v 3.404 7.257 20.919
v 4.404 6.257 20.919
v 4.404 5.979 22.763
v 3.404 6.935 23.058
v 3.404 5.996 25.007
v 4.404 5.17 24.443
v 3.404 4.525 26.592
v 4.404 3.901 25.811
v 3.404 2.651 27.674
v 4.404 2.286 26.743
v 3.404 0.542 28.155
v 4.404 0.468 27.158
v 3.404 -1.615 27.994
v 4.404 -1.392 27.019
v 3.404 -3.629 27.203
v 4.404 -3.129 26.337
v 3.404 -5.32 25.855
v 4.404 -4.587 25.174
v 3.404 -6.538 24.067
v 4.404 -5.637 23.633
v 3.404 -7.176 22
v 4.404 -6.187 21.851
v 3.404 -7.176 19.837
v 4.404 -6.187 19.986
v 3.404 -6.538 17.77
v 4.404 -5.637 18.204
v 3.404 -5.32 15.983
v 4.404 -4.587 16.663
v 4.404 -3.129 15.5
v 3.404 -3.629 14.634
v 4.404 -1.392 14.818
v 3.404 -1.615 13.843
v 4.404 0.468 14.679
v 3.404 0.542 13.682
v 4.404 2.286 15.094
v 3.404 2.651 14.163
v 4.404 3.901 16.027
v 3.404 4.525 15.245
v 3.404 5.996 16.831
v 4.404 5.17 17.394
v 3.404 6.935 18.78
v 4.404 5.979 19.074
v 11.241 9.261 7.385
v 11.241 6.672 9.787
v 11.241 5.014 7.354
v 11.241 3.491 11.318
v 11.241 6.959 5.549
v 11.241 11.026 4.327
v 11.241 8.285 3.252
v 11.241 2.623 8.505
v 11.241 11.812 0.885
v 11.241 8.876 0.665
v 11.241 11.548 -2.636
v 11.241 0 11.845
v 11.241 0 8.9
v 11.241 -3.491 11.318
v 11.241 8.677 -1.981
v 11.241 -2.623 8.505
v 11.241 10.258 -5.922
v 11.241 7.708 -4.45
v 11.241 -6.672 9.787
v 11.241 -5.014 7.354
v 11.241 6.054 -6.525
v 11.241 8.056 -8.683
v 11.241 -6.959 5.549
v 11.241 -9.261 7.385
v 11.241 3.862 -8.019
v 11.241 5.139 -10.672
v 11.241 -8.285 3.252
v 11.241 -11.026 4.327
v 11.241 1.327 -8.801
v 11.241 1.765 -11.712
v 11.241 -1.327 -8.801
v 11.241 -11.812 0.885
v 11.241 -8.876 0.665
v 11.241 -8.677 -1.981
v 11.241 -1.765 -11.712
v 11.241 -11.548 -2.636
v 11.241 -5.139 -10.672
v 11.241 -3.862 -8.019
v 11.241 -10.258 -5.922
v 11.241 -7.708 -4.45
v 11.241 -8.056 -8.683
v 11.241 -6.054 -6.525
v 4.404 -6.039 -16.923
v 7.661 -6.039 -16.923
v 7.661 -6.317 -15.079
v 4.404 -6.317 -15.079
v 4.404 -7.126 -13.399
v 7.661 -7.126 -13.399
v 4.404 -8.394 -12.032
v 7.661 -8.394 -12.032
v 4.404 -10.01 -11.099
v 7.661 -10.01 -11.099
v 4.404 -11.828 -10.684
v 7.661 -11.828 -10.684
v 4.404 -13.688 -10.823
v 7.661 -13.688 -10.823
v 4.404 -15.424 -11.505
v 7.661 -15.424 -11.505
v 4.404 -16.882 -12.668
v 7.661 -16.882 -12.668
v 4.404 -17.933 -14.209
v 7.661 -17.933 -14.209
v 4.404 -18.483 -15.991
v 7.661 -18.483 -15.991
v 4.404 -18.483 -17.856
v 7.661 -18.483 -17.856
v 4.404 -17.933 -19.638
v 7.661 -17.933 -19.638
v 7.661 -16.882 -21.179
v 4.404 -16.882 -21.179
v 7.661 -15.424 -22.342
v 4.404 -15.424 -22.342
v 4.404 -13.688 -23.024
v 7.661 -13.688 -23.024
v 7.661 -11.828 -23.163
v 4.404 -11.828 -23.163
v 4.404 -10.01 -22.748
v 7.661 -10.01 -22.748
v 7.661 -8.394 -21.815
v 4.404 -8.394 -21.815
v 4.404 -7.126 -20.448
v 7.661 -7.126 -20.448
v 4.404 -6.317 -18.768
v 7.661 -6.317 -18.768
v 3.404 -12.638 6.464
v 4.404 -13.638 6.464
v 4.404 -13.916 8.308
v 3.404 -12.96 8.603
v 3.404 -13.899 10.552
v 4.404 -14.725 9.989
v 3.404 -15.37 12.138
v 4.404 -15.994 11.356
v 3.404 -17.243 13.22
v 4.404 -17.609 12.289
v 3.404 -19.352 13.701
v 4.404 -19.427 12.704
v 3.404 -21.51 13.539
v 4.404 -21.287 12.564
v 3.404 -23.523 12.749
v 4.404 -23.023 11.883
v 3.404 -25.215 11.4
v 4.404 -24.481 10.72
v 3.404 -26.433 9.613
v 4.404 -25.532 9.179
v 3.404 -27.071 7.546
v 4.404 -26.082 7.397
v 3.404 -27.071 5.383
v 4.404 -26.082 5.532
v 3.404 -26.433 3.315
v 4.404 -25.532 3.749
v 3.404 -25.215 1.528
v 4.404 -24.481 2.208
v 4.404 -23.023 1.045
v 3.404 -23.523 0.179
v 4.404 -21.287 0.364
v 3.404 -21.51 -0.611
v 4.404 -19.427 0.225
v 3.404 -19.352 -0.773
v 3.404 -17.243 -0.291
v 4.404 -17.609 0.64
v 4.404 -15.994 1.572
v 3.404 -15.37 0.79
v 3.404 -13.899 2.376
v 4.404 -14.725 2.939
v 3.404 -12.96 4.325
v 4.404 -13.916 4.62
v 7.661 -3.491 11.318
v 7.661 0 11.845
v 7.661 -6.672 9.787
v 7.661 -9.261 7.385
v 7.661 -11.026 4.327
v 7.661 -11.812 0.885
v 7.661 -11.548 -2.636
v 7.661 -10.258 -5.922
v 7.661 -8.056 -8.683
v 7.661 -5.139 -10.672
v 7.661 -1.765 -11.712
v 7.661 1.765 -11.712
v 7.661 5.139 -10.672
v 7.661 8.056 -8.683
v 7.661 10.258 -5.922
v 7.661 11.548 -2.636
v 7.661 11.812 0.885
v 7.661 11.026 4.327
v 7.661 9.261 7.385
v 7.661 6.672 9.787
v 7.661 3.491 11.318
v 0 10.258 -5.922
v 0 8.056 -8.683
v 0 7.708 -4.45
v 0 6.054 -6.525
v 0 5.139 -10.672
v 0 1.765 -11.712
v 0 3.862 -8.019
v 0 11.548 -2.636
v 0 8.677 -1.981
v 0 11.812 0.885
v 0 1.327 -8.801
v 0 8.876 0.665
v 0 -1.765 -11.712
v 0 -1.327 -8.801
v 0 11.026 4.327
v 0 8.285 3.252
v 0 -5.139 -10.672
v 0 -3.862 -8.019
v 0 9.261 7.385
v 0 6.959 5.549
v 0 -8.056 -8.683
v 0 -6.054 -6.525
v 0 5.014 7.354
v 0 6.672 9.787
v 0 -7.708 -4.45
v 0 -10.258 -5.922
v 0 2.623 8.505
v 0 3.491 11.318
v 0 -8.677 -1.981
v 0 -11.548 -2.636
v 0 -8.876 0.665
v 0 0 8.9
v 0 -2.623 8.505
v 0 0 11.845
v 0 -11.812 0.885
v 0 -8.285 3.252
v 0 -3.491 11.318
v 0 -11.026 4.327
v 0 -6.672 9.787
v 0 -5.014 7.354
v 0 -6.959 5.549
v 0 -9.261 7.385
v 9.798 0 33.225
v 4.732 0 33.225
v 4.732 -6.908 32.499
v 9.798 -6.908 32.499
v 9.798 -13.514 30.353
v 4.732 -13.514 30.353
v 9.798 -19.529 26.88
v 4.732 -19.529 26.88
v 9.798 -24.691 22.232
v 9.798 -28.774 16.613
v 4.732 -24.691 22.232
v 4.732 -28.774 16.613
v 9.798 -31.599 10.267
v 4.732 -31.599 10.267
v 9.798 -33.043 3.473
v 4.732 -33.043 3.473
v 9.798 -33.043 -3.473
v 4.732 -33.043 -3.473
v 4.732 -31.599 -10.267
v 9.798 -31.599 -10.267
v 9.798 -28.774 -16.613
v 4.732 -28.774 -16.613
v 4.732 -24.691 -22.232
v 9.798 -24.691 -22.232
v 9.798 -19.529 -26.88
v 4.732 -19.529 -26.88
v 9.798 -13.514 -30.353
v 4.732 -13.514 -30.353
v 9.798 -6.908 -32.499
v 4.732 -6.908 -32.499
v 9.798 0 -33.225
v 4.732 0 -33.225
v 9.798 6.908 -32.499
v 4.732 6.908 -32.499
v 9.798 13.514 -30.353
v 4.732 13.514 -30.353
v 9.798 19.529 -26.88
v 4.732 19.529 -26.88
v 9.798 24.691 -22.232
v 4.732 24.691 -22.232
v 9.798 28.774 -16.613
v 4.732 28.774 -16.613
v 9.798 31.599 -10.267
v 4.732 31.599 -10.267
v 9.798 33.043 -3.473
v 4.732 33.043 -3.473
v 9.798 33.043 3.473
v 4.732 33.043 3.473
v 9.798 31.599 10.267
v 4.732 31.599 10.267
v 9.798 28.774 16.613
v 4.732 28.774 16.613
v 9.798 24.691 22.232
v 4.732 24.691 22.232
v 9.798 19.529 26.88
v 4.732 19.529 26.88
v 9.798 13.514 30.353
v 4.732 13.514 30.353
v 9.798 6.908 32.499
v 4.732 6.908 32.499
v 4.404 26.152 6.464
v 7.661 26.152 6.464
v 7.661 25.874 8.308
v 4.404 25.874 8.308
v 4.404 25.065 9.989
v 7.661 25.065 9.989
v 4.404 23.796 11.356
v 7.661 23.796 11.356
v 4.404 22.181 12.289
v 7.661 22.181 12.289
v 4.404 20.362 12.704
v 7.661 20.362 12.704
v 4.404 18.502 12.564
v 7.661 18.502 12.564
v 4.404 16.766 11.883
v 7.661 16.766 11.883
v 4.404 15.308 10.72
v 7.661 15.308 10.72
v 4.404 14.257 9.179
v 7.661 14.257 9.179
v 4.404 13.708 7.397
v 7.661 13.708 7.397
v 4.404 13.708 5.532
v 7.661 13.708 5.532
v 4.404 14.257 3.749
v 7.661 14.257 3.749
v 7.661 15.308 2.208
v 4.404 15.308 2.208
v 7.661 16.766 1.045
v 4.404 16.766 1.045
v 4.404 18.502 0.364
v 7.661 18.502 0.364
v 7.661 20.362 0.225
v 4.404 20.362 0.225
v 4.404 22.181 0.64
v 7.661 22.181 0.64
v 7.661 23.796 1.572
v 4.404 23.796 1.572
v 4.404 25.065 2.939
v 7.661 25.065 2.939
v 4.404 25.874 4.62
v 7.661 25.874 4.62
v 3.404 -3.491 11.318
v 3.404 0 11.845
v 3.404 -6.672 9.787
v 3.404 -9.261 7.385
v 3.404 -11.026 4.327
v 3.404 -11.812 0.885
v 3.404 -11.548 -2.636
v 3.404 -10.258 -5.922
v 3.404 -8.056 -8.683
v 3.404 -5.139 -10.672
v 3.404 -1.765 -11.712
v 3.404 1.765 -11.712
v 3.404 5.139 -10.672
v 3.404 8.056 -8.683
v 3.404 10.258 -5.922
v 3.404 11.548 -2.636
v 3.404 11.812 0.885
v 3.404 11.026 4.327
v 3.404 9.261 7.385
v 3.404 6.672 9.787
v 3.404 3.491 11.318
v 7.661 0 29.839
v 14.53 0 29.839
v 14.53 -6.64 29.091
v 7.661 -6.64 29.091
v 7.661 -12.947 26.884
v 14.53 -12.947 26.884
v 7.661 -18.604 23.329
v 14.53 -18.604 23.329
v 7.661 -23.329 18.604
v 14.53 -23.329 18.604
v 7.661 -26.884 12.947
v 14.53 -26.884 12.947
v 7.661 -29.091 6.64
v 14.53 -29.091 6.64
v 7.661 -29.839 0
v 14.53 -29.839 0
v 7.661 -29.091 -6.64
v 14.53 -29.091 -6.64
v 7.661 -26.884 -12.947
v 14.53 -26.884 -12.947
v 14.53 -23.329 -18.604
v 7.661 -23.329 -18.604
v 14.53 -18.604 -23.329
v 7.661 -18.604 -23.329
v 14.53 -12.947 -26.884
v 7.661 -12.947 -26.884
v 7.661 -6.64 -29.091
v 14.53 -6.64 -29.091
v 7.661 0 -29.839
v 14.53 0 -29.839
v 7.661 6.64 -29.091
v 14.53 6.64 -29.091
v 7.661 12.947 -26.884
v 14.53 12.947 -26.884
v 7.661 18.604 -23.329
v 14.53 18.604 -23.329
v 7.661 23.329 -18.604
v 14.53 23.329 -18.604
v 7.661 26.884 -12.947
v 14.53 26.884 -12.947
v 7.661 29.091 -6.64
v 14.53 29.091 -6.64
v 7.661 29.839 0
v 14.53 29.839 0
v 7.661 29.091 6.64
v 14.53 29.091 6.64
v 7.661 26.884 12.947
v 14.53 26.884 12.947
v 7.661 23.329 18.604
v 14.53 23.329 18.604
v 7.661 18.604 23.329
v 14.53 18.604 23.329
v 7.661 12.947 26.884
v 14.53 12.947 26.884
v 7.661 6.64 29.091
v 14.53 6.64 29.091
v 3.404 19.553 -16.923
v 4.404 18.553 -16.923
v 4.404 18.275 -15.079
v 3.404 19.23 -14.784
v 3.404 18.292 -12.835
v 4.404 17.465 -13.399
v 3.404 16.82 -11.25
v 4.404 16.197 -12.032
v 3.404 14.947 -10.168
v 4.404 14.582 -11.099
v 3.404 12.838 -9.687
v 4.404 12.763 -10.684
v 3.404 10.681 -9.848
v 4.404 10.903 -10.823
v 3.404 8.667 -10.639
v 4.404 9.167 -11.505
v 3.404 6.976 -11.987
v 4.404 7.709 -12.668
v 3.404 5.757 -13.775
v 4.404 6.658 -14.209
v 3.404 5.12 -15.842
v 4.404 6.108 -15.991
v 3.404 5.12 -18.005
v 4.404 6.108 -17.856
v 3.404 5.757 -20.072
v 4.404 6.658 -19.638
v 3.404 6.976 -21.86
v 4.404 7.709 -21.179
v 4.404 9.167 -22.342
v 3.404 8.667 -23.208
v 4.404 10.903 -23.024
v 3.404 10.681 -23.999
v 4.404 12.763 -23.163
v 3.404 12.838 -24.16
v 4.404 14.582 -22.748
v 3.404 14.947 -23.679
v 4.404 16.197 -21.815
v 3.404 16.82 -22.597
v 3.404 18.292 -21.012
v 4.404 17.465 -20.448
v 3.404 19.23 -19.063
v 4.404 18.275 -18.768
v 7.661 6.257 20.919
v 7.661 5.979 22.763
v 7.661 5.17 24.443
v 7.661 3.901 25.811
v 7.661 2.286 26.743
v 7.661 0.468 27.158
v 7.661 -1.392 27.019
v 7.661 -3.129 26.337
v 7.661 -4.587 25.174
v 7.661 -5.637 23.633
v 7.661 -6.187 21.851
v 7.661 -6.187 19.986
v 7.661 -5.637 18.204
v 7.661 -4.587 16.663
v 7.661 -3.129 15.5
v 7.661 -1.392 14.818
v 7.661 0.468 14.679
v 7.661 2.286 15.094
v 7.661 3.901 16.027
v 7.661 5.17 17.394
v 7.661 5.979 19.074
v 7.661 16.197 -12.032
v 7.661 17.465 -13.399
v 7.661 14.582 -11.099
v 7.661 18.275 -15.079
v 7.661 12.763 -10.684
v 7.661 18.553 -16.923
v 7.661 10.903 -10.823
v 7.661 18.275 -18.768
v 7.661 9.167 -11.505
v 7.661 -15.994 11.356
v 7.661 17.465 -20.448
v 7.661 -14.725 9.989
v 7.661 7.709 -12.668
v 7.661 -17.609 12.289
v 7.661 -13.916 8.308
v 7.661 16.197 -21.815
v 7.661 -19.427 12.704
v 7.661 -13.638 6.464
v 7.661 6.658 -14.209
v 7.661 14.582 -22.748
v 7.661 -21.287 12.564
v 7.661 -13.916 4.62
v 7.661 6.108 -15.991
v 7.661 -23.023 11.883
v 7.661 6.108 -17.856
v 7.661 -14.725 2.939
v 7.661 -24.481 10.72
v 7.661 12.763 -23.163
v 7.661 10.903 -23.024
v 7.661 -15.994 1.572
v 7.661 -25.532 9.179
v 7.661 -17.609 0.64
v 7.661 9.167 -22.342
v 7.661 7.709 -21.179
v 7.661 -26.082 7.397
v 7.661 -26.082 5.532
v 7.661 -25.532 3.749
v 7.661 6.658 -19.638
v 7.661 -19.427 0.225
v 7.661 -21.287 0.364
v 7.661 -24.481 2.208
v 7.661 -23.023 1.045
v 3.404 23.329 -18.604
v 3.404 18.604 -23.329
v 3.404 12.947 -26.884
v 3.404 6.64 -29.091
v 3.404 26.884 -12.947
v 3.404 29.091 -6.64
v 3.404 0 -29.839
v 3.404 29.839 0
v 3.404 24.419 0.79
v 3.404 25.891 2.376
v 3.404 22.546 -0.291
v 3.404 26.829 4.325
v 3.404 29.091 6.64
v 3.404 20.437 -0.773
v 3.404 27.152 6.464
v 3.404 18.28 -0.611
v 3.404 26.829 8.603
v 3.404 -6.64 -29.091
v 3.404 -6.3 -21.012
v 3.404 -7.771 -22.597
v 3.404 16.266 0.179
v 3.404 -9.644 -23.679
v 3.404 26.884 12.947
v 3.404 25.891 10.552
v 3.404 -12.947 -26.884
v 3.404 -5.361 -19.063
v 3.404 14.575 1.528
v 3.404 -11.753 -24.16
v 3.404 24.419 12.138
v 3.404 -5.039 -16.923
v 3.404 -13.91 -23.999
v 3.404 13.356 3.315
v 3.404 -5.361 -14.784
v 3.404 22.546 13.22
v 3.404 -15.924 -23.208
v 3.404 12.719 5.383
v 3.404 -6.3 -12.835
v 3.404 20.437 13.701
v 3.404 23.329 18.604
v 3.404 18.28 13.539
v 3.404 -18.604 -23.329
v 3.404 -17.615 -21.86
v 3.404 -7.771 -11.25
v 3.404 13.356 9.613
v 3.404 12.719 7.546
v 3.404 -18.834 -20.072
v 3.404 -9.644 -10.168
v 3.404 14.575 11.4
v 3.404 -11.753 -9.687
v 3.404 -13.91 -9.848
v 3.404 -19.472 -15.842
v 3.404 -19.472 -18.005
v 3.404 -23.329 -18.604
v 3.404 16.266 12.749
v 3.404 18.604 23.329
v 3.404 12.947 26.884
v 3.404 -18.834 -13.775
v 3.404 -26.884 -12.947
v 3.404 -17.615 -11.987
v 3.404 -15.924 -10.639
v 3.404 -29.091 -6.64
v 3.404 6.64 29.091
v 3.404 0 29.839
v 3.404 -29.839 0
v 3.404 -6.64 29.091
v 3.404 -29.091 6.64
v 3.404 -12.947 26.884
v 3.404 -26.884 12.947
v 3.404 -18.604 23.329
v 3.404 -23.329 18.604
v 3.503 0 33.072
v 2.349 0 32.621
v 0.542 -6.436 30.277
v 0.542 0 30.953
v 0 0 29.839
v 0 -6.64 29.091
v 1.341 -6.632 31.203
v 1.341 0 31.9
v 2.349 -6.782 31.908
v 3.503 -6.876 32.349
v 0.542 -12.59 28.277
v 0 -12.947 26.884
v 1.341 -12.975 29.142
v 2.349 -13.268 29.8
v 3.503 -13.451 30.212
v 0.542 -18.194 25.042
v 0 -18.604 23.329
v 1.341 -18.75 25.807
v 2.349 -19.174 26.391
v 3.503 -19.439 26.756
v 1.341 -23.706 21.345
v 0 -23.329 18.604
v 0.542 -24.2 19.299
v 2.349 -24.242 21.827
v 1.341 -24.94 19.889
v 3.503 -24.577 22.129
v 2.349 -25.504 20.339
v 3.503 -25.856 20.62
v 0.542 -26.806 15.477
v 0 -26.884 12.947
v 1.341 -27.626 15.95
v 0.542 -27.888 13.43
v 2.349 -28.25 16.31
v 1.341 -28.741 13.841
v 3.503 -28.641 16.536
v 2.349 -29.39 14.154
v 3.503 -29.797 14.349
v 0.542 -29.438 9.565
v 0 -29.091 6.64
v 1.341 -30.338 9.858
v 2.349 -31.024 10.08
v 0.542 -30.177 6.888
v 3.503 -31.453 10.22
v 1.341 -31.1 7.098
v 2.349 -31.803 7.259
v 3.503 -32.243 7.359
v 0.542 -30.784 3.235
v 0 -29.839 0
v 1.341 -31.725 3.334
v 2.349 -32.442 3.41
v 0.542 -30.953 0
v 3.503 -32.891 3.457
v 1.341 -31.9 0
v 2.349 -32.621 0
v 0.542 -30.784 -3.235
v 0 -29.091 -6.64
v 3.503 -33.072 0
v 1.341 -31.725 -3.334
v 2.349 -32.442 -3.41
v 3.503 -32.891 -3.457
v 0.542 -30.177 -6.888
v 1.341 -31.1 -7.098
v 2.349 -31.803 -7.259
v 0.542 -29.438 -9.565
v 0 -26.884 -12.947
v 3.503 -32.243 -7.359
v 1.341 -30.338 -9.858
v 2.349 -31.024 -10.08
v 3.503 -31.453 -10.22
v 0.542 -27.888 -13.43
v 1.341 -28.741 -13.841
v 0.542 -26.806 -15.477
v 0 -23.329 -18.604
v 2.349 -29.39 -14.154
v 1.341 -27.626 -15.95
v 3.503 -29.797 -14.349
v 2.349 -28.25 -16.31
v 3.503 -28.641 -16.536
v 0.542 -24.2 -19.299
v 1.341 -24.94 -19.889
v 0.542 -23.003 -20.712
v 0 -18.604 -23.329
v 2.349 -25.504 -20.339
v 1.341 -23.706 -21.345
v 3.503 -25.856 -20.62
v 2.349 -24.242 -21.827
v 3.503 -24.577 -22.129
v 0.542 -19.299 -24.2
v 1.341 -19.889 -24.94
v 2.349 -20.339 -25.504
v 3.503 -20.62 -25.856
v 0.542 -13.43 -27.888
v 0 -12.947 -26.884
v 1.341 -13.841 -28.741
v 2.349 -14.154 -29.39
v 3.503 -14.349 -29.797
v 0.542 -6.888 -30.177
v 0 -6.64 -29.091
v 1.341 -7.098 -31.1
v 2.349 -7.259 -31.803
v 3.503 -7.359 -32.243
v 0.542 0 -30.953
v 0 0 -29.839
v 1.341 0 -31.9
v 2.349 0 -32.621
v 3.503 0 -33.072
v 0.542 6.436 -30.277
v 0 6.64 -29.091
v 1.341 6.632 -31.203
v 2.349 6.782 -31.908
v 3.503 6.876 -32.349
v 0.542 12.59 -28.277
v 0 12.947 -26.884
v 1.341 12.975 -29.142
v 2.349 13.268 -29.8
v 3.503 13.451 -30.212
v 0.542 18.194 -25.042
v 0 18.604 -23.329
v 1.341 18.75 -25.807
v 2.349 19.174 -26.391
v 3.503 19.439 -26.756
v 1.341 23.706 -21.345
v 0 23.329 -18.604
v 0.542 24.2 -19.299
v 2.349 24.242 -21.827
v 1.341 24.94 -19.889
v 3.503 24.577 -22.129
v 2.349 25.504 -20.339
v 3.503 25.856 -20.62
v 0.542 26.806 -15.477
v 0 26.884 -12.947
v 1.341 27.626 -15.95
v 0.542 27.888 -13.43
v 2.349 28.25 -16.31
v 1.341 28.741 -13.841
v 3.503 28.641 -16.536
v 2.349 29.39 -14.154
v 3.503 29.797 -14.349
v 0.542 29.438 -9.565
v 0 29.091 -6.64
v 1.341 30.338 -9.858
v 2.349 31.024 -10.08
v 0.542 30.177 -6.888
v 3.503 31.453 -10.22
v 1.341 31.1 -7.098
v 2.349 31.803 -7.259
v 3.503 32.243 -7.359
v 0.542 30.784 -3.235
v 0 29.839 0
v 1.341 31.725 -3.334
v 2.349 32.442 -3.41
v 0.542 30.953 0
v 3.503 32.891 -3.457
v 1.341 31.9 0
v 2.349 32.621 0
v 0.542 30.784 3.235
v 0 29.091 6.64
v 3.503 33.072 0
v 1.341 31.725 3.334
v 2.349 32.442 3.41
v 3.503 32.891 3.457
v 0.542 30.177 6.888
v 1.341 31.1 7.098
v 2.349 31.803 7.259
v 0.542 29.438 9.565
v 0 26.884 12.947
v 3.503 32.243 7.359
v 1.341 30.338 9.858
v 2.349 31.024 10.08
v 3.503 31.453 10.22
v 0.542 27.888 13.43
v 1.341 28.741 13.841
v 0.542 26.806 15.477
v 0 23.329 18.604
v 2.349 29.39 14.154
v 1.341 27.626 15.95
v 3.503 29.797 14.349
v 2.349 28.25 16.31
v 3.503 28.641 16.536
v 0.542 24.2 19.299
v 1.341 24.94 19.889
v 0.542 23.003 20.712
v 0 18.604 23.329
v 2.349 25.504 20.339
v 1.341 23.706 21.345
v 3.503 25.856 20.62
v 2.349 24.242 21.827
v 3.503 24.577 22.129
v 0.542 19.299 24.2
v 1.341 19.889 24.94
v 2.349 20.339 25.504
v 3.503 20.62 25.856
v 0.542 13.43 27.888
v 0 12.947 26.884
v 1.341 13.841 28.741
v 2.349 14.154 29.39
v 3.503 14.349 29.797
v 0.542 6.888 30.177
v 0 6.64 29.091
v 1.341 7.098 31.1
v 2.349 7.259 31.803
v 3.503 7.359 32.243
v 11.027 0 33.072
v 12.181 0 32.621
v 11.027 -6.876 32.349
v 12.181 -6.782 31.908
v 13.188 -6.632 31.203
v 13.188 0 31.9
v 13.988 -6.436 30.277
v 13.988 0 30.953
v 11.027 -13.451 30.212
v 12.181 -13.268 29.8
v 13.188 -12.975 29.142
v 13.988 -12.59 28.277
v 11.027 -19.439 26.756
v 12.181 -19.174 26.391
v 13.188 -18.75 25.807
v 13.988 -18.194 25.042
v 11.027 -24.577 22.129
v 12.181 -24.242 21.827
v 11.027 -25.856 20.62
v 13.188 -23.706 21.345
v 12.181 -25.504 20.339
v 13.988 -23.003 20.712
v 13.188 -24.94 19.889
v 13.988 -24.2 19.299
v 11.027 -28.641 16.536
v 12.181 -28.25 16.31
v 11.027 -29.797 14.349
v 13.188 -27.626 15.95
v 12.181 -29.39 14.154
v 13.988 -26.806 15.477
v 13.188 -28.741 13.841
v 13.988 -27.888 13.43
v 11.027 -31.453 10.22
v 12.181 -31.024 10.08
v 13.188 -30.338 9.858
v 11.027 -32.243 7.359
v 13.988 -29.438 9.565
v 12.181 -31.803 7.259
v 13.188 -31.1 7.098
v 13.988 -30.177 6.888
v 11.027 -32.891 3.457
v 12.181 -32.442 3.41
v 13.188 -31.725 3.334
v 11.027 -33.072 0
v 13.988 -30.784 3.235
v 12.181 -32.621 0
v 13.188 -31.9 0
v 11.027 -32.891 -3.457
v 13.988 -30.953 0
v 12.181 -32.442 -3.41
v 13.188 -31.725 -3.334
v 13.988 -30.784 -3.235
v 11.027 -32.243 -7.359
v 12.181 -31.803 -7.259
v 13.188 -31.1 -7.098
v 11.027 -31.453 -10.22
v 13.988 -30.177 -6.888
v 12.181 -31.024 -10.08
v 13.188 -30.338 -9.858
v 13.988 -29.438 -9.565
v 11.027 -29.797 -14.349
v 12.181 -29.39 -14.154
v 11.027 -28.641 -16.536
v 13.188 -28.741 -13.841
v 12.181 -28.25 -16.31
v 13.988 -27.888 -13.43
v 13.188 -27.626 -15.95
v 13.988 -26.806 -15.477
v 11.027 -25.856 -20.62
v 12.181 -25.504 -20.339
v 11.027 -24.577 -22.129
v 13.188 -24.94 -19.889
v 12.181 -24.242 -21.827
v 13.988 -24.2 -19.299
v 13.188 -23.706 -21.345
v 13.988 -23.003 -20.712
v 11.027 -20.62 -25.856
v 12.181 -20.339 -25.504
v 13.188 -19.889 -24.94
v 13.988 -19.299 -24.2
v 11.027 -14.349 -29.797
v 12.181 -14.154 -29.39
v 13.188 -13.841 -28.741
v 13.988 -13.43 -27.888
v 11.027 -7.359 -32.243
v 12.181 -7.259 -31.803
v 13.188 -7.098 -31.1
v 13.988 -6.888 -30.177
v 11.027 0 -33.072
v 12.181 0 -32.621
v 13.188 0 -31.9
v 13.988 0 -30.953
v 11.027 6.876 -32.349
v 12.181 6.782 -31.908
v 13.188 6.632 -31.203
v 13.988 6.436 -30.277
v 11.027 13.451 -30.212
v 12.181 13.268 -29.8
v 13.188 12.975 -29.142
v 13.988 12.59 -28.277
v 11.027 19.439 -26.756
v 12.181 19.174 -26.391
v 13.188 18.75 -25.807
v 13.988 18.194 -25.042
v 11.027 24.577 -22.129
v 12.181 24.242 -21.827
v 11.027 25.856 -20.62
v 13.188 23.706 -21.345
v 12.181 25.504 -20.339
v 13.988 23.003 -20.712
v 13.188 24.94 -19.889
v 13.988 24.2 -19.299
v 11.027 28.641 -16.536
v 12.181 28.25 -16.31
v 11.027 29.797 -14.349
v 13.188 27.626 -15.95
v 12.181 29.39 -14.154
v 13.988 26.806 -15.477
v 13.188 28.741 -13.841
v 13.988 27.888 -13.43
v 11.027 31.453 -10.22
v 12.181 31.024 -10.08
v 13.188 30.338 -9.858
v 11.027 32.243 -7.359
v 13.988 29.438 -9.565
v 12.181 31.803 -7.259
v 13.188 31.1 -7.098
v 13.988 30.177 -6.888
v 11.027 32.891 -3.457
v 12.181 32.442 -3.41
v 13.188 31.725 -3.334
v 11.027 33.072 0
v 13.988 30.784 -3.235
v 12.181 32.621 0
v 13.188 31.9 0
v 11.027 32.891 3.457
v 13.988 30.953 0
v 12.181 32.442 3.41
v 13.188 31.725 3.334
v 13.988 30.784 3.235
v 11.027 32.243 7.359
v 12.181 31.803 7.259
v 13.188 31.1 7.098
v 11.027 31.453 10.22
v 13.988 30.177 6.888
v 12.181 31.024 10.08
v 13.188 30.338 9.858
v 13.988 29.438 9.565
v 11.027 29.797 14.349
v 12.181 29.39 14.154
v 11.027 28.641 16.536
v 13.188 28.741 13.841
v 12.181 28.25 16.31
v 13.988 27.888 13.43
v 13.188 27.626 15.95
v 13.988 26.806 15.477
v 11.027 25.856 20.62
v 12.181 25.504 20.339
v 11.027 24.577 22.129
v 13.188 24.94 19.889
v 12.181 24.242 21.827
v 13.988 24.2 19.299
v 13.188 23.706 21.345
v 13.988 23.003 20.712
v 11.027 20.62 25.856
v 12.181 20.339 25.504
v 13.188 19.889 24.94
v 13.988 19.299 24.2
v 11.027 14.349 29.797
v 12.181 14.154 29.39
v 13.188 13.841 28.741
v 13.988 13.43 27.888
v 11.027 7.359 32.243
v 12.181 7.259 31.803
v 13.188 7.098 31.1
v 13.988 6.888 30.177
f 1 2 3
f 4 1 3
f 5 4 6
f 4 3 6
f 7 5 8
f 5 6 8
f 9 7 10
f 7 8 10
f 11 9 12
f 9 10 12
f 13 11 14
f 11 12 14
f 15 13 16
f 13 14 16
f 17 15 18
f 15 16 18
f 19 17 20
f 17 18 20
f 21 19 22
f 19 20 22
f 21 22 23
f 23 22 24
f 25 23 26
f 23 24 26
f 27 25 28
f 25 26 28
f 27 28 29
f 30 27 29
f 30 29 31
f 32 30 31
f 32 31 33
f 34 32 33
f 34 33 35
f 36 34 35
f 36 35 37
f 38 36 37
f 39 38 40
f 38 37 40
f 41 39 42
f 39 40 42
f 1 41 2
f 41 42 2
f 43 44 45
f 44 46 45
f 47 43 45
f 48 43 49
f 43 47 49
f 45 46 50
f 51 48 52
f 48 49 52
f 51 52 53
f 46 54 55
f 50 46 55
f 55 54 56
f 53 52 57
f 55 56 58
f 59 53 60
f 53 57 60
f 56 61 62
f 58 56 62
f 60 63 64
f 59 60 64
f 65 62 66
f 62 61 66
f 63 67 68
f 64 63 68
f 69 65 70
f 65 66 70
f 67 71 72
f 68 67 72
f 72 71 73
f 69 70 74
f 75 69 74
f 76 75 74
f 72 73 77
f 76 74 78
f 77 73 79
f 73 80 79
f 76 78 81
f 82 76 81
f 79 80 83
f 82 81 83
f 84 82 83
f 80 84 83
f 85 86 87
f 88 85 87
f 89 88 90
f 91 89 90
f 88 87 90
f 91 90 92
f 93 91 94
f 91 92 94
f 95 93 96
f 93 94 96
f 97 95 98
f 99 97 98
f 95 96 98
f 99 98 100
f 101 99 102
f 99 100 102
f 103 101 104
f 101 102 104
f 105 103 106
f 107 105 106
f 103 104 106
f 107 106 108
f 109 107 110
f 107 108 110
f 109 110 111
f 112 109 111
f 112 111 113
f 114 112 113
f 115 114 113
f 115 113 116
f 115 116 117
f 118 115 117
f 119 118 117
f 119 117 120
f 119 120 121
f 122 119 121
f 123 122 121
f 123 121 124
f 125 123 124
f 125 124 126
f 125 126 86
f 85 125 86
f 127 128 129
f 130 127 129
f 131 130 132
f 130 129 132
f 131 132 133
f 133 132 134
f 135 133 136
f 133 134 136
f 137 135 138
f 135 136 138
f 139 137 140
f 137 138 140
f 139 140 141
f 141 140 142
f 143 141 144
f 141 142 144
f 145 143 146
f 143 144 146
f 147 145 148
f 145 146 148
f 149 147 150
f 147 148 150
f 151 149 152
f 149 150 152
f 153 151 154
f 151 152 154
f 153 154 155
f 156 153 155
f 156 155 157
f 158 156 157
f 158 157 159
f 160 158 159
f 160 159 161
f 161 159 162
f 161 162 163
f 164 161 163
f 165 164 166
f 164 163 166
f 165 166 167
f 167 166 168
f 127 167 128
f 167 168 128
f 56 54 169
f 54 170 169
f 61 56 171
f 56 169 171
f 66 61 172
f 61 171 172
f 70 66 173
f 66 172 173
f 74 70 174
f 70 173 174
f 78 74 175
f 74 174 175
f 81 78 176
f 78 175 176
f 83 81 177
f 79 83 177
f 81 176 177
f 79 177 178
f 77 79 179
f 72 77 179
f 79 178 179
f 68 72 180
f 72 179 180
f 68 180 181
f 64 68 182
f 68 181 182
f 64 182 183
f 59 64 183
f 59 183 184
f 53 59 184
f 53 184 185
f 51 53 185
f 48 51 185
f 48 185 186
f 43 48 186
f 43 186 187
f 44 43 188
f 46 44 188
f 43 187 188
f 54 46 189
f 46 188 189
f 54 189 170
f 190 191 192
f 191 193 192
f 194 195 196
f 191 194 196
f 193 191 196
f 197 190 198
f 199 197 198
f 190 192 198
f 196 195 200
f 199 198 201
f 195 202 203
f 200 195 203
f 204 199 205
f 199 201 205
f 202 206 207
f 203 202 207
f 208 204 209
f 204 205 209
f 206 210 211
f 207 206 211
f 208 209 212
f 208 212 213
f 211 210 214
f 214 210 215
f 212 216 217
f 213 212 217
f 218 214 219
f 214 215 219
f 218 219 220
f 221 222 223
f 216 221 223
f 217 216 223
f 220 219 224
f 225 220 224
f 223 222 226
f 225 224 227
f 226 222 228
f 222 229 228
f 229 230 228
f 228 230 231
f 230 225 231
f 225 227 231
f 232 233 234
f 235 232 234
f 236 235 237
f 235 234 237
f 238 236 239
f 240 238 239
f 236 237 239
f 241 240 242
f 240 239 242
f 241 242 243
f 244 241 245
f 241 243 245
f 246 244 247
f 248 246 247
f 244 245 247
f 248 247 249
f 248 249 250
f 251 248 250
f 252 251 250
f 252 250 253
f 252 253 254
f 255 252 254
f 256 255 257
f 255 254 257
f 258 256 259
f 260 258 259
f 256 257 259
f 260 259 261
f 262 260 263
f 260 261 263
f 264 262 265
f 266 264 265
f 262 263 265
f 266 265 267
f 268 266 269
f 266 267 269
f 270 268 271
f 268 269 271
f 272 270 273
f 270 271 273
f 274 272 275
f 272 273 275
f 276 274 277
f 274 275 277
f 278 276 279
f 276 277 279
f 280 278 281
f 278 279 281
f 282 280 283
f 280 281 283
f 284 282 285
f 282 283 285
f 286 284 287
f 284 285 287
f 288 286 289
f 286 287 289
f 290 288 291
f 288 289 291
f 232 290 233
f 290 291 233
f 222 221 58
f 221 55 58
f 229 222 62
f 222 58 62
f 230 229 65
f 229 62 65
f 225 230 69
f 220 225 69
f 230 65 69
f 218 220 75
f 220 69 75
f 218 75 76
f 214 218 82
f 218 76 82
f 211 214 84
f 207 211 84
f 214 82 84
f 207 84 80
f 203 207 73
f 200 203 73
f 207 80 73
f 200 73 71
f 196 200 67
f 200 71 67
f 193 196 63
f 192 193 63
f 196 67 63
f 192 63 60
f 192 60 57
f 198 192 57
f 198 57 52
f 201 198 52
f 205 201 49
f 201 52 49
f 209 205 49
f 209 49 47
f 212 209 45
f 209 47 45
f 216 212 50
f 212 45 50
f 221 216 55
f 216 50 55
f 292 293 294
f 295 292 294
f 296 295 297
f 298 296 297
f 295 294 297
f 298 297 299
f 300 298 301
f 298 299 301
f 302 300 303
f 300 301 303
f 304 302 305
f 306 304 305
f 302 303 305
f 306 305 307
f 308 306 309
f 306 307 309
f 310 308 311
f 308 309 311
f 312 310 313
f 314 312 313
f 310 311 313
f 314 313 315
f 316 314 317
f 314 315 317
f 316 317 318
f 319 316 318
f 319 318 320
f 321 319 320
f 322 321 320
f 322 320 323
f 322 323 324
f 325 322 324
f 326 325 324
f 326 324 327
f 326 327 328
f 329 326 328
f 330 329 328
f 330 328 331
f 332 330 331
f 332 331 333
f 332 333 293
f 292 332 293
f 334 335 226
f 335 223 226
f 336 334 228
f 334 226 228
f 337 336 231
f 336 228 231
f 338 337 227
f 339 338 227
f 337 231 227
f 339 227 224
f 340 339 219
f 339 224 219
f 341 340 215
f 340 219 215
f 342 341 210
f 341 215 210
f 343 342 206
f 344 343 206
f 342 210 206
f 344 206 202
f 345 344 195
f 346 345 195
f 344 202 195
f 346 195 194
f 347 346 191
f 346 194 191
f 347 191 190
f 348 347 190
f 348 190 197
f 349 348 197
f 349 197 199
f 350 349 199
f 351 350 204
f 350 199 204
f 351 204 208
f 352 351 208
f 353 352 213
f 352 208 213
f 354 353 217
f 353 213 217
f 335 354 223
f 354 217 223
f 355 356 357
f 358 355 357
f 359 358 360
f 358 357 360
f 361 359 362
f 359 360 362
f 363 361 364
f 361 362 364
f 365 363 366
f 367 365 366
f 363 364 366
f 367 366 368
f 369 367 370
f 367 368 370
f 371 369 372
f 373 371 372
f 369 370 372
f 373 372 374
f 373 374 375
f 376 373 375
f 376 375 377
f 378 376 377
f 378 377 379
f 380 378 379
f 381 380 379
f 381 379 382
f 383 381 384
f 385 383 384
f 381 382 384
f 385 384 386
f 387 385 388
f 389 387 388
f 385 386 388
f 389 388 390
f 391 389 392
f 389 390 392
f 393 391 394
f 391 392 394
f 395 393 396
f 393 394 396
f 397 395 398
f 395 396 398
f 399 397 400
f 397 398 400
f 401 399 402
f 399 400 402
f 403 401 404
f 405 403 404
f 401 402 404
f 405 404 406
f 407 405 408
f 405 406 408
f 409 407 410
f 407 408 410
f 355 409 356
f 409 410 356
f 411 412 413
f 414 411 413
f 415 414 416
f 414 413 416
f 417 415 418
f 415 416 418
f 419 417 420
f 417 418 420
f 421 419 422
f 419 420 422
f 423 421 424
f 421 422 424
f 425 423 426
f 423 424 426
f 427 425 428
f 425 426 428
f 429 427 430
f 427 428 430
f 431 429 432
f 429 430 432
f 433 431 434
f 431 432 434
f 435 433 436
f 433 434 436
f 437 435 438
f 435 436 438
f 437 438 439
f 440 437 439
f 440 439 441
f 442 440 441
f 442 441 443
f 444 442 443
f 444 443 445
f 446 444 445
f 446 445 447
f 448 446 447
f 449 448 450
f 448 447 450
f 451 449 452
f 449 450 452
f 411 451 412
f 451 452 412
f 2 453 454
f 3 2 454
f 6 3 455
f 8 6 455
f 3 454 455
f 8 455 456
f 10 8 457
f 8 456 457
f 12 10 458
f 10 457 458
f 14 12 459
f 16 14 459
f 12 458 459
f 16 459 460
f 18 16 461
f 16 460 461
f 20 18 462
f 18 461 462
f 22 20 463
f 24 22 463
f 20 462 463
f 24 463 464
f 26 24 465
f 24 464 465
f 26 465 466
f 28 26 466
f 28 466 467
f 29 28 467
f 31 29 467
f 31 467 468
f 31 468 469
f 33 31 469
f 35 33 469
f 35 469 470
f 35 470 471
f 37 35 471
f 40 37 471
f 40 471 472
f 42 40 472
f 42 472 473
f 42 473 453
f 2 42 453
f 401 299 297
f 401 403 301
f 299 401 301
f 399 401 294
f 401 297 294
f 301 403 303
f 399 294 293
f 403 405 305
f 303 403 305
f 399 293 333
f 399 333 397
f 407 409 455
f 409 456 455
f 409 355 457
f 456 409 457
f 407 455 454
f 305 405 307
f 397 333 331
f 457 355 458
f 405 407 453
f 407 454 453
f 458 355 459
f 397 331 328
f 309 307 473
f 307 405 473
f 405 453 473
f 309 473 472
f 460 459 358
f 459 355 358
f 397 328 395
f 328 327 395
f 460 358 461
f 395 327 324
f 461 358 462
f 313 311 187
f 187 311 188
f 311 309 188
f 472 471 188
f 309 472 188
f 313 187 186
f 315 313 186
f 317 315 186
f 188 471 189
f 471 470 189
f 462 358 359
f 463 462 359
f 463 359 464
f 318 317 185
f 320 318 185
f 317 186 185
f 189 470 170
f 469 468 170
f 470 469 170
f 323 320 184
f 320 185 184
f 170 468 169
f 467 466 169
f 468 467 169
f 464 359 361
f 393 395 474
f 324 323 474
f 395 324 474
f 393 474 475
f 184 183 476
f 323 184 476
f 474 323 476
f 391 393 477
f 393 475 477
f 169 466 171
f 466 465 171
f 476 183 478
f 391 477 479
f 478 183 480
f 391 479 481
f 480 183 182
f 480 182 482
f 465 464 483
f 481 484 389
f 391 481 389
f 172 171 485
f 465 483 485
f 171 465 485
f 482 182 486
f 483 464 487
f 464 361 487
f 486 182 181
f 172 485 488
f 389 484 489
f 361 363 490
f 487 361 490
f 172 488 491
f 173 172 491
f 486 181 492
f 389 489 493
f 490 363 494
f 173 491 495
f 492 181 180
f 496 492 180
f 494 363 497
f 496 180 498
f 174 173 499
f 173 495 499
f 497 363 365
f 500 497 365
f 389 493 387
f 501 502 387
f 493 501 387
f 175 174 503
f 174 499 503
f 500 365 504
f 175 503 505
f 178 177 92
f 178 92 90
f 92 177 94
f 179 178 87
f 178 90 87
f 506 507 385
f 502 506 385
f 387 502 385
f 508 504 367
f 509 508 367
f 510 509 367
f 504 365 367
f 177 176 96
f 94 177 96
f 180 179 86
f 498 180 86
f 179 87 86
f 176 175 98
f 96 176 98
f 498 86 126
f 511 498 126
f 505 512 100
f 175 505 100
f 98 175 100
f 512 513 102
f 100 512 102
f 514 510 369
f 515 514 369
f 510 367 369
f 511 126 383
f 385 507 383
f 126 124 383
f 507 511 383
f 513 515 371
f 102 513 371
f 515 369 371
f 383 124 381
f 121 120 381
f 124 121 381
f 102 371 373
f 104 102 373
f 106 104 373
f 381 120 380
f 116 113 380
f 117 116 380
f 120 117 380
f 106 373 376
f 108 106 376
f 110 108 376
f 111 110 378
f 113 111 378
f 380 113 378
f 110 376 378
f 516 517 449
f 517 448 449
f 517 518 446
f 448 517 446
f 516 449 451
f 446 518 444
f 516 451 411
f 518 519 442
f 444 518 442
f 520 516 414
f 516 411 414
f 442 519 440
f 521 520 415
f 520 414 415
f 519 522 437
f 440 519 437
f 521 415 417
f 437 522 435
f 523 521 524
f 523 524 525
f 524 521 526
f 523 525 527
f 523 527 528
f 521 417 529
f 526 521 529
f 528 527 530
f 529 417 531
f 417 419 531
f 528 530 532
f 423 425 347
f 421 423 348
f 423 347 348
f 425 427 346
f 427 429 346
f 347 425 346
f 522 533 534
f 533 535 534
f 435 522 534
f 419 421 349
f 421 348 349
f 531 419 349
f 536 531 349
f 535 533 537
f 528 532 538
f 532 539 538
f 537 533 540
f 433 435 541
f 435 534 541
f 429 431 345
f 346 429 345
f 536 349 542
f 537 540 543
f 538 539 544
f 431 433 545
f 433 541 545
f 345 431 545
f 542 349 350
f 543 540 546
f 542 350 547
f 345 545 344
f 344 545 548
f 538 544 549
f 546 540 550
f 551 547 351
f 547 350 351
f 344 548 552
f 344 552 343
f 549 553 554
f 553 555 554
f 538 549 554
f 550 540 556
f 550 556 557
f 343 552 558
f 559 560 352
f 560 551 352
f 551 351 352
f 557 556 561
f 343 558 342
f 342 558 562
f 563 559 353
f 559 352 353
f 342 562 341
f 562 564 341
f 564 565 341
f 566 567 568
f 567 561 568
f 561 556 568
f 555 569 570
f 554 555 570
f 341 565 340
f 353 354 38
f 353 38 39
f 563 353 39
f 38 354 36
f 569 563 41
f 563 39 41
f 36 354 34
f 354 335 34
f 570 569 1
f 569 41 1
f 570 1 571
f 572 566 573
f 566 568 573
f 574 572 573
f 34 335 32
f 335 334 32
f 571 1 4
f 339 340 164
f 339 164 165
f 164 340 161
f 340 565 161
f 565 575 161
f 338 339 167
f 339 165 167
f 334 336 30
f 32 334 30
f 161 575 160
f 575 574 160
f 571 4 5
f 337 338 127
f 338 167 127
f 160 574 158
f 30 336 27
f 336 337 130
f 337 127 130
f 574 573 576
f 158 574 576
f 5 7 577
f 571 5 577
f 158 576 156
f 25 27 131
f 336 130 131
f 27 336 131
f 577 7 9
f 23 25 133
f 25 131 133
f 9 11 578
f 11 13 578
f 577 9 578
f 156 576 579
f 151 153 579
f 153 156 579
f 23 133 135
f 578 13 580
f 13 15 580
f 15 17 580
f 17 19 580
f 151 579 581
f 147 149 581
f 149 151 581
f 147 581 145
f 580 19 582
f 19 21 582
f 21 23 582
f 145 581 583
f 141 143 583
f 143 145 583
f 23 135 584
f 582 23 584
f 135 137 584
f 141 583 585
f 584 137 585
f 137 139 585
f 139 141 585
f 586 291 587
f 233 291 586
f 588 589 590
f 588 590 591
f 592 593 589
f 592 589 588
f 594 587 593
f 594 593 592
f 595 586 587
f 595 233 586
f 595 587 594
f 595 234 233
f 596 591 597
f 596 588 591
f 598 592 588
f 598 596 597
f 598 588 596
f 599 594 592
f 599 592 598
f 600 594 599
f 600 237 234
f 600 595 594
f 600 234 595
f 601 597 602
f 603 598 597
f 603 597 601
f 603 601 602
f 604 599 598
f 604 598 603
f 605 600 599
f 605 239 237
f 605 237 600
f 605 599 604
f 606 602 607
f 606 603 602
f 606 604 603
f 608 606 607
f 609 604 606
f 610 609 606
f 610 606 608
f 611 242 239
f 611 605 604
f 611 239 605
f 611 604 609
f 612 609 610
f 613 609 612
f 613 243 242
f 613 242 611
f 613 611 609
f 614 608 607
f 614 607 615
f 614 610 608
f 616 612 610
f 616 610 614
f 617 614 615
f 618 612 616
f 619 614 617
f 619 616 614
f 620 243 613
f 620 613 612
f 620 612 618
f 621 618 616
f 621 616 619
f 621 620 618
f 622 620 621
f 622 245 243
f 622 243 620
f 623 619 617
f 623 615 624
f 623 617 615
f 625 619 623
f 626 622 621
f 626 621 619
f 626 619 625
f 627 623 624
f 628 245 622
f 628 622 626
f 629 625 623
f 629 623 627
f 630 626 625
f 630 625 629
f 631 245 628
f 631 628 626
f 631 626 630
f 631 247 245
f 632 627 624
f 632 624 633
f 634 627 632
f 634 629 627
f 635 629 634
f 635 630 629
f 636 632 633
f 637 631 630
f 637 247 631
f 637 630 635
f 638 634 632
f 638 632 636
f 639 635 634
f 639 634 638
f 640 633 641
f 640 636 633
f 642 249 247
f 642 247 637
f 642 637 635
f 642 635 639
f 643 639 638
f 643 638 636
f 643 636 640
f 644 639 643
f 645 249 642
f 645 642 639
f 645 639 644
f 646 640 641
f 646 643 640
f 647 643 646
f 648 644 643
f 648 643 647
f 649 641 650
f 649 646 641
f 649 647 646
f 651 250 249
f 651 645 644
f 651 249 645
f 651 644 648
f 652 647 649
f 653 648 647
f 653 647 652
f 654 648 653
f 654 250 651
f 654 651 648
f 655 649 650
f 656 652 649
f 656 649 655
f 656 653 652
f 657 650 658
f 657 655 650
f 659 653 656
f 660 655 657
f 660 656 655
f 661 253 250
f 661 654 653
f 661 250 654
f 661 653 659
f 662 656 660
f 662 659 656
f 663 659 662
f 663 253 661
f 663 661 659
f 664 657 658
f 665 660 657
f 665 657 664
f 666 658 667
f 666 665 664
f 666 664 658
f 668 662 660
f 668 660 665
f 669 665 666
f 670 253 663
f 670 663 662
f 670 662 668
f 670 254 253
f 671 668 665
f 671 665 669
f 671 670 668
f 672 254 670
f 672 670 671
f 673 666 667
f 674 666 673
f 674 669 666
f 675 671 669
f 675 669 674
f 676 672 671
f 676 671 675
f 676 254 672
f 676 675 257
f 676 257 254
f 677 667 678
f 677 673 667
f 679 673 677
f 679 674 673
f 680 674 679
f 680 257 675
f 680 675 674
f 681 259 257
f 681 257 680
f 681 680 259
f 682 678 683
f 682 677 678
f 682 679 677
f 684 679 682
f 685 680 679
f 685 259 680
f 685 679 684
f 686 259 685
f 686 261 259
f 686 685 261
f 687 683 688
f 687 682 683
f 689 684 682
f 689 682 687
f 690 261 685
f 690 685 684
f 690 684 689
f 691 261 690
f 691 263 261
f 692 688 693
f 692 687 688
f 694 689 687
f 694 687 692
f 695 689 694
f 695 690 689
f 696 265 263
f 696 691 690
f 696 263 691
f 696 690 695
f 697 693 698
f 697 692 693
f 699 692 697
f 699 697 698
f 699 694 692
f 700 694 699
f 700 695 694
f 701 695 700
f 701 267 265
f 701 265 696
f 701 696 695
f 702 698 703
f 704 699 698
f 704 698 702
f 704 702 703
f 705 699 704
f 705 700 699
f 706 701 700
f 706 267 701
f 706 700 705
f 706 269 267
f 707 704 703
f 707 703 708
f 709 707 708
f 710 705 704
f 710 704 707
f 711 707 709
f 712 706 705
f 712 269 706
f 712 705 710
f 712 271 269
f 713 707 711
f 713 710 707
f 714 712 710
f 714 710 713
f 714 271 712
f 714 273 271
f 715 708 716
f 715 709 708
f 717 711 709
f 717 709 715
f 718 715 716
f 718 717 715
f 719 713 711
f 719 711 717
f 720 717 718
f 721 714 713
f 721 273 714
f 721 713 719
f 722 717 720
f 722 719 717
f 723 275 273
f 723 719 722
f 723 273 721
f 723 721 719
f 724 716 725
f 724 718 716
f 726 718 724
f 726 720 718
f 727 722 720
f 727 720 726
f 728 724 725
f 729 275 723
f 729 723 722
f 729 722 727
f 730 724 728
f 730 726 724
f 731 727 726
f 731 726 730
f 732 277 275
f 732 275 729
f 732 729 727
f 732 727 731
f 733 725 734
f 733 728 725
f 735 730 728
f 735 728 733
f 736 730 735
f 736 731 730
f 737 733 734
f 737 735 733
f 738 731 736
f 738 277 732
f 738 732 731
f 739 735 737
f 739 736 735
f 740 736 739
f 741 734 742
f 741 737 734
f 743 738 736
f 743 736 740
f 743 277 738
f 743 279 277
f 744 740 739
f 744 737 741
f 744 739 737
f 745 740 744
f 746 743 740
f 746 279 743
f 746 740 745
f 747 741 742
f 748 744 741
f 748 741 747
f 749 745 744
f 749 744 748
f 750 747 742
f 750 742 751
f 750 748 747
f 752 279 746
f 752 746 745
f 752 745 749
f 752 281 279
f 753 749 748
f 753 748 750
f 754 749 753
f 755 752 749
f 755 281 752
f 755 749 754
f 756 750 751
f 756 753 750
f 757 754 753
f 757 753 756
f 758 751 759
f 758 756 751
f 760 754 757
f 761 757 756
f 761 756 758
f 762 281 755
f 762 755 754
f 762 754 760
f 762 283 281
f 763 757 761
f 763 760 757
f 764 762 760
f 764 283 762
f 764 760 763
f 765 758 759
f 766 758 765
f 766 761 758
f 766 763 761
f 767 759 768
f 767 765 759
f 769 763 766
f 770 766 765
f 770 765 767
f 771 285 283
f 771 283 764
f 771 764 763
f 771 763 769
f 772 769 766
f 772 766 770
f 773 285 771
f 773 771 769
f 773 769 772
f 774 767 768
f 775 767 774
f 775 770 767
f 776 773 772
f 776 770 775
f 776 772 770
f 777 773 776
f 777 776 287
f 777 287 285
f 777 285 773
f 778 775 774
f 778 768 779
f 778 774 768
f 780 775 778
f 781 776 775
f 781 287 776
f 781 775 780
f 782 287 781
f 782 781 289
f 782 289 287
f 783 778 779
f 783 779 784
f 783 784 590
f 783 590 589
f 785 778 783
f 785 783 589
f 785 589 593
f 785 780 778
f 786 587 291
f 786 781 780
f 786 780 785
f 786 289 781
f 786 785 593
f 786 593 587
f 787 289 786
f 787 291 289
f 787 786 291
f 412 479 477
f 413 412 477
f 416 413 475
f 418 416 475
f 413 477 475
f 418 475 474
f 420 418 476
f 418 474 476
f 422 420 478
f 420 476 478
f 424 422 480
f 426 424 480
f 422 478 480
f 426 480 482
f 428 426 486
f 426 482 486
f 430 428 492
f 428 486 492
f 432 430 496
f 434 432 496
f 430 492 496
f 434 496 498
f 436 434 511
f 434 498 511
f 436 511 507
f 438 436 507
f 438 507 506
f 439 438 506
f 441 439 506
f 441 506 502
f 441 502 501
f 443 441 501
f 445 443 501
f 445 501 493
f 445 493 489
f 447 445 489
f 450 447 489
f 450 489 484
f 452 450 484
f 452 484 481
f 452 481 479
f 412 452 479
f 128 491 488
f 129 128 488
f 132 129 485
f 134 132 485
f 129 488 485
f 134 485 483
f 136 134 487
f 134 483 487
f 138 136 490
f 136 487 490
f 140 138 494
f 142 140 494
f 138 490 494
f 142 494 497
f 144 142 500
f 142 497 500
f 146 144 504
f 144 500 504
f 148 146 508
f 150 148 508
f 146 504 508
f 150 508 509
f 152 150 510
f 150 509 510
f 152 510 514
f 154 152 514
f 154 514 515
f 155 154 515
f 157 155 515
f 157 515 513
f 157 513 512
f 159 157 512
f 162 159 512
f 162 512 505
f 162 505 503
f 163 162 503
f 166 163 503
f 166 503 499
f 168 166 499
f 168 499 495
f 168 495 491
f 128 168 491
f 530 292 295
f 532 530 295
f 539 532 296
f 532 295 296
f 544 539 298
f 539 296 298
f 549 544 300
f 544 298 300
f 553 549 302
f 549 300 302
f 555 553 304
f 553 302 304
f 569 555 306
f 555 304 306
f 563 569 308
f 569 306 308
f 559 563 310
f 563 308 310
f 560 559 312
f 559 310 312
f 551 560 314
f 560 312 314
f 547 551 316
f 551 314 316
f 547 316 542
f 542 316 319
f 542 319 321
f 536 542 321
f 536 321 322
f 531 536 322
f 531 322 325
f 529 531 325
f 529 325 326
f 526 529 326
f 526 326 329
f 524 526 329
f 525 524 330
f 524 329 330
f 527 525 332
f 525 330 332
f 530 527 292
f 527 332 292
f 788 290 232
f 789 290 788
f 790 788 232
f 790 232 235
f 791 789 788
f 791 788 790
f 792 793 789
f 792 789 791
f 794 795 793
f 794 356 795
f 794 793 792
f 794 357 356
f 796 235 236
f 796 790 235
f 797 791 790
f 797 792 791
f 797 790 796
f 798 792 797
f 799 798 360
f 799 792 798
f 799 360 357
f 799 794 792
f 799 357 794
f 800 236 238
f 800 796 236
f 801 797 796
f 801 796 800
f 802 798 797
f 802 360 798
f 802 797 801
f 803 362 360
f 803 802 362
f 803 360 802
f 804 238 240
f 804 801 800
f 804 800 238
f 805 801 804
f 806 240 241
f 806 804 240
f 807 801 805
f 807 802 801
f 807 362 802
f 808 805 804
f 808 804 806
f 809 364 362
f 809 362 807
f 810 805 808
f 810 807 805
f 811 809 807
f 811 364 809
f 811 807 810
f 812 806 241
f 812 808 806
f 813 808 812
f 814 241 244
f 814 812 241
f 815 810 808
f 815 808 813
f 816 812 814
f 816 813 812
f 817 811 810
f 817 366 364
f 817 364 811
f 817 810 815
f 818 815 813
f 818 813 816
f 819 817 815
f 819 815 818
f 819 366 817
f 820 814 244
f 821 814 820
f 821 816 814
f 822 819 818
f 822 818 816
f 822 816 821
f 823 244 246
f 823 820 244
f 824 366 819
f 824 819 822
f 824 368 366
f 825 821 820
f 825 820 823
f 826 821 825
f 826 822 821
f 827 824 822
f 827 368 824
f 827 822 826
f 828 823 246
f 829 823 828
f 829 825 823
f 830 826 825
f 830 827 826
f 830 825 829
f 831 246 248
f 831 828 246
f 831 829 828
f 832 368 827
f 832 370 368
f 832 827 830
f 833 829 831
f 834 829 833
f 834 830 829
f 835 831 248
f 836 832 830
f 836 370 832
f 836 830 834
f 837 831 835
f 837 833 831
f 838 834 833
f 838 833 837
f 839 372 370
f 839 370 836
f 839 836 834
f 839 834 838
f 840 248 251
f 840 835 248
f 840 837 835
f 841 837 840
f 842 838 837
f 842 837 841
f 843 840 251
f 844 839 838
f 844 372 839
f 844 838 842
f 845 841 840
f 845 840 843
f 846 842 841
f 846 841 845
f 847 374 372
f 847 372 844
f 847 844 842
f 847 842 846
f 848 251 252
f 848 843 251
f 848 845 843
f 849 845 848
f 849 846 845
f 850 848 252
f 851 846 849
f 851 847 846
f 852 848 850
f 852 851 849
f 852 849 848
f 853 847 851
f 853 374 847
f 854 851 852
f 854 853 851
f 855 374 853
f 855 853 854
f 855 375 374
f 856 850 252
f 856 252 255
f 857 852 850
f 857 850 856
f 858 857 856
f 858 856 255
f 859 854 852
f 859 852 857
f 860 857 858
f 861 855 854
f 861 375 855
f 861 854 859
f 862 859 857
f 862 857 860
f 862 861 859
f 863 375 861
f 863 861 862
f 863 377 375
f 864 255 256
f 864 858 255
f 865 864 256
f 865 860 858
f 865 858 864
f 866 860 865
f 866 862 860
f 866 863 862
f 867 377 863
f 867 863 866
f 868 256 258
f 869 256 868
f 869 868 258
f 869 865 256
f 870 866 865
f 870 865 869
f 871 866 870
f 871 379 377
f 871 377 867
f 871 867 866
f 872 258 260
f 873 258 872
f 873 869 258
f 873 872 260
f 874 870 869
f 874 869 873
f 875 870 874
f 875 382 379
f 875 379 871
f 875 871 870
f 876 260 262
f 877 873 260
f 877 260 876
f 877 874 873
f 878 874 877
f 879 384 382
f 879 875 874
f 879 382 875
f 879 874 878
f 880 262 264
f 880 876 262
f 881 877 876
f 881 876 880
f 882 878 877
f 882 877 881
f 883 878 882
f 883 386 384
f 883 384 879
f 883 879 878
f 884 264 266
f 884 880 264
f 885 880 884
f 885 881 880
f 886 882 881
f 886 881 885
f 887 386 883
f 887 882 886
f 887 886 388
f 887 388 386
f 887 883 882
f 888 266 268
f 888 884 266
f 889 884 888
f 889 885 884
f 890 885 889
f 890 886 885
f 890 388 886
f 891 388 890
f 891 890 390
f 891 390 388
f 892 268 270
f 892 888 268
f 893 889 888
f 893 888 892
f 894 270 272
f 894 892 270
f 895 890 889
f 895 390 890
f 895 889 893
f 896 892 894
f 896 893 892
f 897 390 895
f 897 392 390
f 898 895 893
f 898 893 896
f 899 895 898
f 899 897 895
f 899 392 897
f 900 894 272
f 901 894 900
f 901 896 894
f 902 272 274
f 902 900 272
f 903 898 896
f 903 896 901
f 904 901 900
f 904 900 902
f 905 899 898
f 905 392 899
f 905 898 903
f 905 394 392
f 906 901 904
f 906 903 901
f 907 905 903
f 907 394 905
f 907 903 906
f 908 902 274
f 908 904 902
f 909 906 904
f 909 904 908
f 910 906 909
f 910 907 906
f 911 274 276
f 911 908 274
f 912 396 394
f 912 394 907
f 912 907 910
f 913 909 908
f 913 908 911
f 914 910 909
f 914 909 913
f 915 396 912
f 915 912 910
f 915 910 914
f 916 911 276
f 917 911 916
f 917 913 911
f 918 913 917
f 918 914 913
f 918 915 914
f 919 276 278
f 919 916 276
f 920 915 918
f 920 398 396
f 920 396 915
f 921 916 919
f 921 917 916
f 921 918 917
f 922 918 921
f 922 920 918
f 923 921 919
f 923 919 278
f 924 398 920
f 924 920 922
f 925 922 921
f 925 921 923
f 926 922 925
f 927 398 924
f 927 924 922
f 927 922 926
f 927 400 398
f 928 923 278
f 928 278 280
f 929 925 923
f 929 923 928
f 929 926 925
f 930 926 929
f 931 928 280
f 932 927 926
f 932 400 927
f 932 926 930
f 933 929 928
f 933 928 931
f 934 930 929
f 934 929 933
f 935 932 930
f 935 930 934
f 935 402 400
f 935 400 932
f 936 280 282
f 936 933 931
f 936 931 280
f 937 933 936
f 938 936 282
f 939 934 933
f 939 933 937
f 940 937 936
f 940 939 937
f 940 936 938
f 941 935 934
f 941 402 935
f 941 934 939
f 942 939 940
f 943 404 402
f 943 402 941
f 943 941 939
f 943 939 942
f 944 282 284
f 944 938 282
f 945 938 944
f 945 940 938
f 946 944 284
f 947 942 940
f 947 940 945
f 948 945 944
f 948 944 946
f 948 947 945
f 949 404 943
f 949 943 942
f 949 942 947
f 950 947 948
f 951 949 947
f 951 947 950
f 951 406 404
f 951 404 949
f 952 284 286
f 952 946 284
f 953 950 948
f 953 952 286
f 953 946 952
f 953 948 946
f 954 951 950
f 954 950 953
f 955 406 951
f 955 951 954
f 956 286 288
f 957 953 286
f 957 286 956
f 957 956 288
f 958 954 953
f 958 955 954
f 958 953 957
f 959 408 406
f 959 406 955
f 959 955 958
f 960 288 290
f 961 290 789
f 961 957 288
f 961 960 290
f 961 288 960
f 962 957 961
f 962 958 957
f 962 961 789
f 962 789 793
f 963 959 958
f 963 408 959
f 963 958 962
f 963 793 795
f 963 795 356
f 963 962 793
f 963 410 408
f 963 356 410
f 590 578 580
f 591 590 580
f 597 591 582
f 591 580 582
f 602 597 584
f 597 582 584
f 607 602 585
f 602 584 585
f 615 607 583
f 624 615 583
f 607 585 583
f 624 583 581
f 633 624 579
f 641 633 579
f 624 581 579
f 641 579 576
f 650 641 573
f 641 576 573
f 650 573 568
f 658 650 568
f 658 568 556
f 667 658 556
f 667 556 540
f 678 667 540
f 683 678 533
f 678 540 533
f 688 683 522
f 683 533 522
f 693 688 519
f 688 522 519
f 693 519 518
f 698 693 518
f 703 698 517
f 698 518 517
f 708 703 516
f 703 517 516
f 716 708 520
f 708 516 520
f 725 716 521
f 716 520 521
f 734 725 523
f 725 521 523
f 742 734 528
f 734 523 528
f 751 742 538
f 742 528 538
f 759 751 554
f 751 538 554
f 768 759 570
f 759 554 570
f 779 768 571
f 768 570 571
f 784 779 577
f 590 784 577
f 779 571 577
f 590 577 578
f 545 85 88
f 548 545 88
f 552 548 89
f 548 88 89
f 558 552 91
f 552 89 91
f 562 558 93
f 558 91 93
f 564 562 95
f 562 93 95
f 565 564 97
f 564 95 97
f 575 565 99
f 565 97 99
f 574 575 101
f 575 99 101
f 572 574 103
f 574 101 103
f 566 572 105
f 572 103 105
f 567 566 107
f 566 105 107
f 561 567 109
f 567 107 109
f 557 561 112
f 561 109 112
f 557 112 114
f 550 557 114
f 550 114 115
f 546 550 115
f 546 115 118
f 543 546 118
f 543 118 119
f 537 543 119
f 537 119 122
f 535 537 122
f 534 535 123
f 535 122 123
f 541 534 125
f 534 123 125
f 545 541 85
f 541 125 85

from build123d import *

# Parameters (mm, degrees)
F2_R     = 6.2570278464
F3_DEPTH = 25
F5_SIZE  = 1


# Not quite as in the source:
# - a fillet or chamfer that OpenCascade refuses, or shapes differently, is made with other operations: its cross-section is extruded or revolved along the edge and cut away or added


with BuildPart() as f1:
    # F0 (on Front) → F1 (revolve)
    with BuildSketch(Plane.XZ):
        Polygon((0, 11.8446564302), (0, 8.9004915208), (11.2406639382, 8.9004915208), (11.2406639382, 11.8446564302), (7.6611181721, 11.8446564302), (7.6611181721, 29.8391282558), (14.5299769938, 29.8391282558), (14.5299769938, 33.2251861691), (0, 33.2251861691), (0, 29.8391282558), (3.4043616615, 29.8391282558), (3.4043616615, 11.8446564302), align=None)
    revolve(axis=Axis((7.4493242428, 0, 0), (1, 0, 0)))

    # F2 (on face) → F3 (cut)
    with BuildSketch(Plane.YZ.offset(7.6611181721)):
        with Locations((0, 20.9185741842)):
            Circle(F2_R)
        with Locations((19.8947462895, 6.464194921)):
            Circle(F2_R)
        with Locations((12.2956294044, -16.9234820131)):
            Circle(F2_R)
        with Locations((-12.2956294044, -16.9234820131)):
            Circle(F2_R)
        with Locations((-19.8947462895, 6.464194921)):
            Circle(F2_R)
    extrude(amount=-F3_DEPTH, mode=Mode.SUBTRACT)

    # F4: fillet of radius 5 on 3 edges, made by hand

    # F4_s1 → F4_t2 (revolve, cut)
    with BuildSketch(Plane.XZ):
        with BuildLine():
            ThreePointArc((9.7976212442, 33.2251861691), (12.7071134307, 32.2914934887), (14.5299769938, 29.8391282558))
            Line((14.5299769938, 29.8391282558), (14.6246241088, 29.8714070976))
            ThreePointArc((14.6246241088, 29.8714070976), (14.6299769938, 31.5321572125), (14.6299769938, 33.2251861691))
            Line((14.6299769938, 33.2251861691), (14.5299769938, 33.3251861691))
            Line((14.5299769938, 33.3251861691), (9.7976212442, 33.3251861691))
            Line((9.7976212442, 33.3251861691), (9.7976212442, 33.2251861691))
        make_face()
    revolve(axis=Axis((14.5299769938, 0, 0), (1, 0, 0)), mode=Mode.SUBTRACT)

    # F4_s3 → F4_t4 (revolve, cut)
    with BuildSketch(Plane.XZ):
        with BuildLine():
            ThreePointArc((0, 29.8391282558), (1.8228635631, 32.2914934887), (4.7323557496, 33.2251861691))
            Line((4.7323557496, 33.2251861691), (4.7323557496, 33.3251861691))
            Line((4.7323557496, 33.3251861691), (0, 33.3251861691))
            Line((0, 33.3251861691), (-0.1, 33.2251861691))
            ThreePointArc((-0.1, 33.2251861691), (-0.1, 31.5321572125), (-0.094647115, 29.8714070976))
            Line((-0.094647115, 29.8714070976), (0, 29.8391282558))
        make_face()
    revolve(axis=Axis((0, 0, 0), (1, 0, 0)), mode=Mode.SUBTRACT)

    # F5
    f5_edges = [f1.edges().sort_by_distance(p)[0] for p in [
        (3.404362, -6.257028, 20.918574),
        (3.404362, -26.151774, 6.464195),
        (3.404362, -18.552657, -16.923482),
        (3.404362, 6.038602, -16.923482),
        (3.404362, 13.637718, 6.464195),
    ]]
    chamfer(f5_edges, length=F5_SIZE)


solid = f1.part
